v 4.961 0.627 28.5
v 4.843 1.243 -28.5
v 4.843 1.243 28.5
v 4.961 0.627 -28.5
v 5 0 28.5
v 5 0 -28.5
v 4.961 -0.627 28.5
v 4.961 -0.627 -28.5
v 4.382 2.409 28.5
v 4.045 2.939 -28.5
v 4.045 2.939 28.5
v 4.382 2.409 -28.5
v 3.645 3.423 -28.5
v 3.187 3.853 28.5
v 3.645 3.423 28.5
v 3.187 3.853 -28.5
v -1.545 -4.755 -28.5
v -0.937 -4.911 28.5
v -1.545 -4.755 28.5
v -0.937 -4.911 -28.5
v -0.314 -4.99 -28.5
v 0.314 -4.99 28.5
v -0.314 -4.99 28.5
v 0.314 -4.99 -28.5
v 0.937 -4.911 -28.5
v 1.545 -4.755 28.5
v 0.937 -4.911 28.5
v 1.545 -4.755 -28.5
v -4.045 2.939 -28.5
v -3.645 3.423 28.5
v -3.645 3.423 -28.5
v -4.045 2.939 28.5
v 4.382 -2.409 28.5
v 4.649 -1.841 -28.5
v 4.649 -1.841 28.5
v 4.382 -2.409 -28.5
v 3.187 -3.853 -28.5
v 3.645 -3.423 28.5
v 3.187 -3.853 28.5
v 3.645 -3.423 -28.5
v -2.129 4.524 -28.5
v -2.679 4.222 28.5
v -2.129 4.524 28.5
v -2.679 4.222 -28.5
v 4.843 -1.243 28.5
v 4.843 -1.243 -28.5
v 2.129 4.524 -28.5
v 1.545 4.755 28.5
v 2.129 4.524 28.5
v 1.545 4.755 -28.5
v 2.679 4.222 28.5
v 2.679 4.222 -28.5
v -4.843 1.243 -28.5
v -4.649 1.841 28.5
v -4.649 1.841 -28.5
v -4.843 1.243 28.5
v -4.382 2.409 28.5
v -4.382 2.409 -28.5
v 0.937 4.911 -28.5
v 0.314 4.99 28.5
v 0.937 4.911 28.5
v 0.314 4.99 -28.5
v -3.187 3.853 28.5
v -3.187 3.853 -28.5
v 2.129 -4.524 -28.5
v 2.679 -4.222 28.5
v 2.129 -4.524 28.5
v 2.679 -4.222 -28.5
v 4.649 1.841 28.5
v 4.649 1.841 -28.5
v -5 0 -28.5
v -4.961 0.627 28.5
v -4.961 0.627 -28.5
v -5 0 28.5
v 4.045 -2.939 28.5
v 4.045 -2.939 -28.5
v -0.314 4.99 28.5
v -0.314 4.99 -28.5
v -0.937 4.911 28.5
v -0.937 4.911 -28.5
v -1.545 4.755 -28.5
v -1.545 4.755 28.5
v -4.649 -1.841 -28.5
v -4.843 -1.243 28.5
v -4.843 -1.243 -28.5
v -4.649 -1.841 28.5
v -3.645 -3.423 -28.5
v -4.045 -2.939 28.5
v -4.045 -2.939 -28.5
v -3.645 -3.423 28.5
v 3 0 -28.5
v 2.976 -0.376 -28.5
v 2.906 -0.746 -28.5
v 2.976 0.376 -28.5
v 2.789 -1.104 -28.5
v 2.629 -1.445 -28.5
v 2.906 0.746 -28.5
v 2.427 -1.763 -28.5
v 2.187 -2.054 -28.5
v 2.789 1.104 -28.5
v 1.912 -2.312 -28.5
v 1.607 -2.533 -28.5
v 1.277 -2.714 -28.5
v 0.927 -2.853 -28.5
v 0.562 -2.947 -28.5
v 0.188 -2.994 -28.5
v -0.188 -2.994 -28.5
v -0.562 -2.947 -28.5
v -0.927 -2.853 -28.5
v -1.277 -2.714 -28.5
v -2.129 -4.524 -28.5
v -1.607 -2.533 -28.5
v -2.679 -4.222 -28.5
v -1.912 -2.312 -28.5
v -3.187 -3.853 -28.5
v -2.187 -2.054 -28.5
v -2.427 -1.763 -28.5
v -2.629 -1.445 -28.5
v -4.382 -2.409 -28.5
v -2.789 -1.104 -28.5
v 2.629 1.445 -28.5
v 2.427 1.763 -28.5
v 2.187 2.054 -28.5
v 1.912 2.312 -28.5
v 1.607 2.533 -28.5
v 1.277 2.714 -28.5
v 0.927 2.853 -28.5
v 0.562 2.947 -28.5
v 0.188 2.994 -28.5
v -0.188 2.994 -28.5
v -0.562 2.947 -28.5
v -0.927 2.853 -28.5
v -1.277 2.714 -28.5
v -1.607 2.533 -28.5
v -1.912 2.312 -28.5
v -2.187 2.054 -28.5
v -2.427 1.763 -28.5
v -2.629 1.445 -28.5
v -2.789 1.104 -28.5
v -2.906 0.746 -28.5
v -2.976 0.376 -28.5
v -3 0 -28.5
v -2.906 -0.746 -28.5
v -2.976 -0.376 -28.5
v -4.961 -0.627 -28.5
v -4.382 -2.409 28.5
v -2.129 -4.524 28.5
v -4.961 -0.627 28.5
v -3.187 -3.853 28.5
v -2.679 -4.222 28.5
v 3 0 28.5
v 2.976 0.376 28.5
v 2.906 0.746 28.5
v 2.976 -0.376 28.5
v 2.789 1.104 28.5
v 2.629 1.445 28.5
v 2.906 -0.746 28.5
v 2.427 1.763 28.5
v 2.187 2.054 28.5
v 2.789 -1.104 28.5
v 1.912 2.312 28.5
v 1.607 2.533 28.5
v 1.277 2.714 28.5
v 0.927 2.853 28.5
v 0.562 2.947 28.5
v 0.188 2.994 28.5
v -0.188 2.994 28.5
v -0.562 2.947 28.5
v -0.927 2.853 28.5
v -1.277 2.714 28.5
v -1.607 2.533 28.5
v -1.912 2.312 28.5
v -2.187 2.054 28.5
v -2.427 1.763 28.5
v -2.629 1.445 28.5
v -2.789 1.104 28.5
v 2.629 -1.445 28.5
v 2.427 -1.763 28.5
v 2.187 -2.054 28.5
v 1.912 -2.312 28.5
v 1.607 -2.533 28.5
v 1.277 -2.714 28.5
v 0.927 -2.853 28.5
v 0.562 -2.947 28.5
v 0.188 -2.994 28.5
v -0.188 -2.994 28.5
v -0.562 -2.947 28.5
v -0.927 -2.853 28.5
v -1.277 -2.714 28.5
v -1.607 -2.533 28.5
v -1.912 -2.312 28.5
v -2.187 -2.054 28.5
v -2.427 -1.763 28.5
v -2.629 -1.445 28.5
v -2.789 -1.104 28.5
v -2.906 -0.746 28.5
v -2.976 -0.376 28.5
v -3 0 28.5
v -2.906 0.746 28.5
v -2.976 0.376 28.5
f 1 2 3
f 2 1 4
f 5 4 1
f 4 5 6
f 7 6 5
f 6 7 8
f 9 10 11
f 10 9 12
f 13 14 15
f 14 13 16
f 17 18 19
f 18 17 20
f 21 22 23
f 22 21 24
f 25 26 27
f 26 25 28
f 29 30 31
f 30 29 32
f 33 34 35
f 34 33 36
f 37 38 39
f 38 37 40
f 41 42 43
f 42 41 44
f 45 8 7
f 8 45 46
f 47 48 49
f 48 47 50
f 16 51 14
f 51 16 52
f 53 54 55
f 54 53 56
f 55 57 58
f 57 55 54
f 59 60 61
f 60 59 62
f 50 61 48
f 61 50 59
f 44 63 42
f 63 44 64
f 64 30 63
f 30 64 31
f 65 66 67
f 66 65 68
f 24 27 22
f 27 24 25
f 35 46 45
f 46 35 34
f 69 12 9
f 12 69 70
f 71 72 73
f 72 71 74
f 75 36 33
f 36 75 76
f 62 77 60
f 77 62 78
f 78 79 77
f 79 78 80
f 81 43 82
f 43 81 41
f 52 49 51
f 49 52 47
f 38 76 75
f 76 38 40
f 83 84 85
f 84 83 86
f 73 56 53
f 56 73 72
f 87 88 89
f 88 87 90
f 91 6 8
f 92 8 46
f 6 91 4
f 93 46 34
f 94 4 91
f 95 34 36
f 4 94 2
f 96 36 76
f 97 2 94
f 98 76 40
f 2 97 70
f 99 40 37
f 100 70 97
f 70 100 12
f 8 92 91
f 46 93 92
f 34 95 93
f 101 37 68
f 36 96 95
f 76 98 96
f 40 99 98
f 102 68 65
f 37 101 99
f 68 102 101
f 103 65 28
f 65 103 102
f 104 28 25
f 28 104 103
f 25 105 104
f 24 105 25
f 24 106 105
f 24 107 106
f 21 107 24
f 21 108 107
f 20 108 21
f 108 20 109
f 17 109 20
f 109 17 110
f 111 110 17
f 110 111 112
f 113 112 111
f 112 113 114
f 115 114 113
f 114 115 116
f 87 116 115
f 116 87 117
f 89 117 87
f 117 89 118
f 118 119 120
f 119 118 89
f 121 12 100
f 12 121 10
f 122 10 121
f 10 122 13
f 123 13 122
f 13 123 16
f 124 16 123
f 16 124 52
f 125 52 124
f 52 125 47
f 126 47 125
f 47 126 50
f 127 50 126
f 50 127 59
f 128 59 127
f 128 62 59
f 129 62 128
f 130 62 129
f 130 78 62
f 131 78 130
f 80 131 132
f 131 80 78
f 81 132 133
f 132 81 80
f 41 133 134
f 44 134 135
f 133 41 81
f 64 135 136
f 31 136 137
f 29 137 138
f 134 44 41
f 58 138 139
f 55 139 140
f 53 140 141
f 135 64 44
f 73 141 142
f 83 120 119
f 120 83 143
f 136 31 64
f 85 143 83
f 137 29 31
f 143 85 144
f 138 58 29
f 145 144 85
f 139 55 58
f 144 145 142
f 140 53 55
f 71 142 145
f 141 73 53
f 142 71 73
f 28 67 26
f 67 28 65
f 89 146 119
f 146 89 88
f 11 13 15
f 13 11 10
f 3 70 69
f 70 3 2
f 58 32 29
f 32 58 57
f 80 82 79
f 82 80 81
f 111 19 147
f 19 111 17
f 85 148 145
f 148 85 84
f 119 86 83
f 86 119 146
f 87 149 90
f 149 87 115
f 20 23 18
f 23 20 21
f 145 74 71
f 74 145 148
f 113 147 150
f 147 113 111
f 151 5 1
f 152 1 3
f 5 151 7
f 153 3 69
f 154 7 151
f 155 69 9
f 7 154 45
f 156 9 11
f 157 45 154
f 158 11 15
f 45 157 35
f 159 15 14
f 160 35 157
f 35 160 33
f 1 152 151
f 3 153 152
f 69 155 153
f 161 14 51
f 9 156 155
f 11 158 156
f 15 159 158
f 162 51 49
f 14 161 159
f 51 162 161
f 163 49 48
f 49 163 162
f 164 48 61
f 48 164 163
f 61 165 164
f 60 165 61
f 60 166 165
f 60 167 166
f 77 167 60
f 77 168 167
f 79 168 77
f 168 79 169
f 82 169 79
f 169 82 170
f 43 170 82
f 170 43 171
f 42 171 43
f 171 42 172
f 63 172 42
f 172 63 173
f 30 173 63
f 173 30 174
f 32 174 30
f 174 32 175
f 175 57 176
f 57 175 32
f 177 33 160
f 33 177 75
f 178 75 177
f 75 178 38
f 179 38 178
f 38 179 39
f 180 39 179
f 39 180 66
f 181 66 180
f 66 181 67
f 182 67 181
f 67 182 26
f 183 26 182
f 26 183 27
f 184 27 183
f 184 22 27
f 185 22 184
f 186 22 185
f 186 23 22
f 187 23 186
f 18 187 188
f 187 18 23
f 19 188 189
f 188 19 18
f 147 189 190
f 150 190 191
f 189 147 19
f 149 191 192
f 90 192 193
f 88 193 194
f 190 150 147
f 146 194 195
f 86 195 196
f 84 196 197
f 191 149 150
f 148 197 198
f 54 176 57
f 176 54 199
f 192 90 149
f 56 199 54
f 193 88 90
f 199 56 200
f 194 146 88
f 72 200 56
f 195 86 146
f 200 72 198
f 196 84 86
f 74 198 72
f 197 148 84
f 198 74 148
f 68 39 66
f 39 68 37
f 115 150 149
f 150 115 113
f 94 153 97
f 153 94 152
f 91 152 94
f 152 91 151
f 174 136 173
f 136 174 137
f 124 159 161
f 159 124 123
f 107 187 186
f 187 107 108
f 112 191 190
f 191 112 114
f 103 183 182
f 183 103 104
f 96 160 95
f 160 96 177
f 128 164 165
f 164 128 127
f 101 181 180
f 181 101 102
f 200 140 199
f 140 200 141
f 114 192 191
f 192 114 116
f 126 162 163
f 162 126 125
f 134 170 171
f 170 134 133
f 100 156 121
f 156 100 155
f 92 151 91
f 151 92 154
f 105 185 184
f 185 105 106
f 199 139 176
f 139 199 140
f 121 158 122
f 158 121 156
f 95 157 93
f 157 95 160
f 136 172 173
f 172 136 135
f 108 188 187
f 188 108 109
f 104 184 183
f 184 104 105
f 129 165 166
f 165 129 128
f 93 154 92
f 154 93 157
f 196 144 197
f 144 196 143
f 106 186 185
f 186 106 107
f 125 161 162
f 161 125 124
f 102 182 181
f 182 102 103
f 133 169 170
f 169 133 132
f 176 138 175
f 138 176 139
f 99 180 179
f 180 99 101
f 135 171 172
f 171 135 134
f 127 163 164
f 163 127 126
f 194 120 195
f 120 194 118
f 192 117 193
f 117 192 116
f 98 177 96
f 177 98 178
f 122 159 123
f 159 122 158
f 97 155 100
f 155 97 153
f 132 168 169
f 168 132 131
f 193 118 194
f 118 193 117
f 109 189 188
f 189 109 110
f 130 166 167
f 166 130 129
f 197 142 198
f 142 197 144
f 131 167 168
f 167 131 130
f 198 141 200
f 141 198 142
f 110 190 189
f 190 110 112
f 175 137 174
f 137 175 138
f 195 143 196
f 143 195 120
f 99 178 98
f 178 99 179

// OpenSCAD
$fn = 50;


difference() {
	union() {
		translate(v = [0, 0, -28.5000000000]) {
			cylinder(h = 57, r = 5.0000000000);
		}
	}
	union() {
		translate(v = [0, 0, -100.0000000000]) {
			cylinder(h = 200, r = 3.0000000000);
		}
	}
}
